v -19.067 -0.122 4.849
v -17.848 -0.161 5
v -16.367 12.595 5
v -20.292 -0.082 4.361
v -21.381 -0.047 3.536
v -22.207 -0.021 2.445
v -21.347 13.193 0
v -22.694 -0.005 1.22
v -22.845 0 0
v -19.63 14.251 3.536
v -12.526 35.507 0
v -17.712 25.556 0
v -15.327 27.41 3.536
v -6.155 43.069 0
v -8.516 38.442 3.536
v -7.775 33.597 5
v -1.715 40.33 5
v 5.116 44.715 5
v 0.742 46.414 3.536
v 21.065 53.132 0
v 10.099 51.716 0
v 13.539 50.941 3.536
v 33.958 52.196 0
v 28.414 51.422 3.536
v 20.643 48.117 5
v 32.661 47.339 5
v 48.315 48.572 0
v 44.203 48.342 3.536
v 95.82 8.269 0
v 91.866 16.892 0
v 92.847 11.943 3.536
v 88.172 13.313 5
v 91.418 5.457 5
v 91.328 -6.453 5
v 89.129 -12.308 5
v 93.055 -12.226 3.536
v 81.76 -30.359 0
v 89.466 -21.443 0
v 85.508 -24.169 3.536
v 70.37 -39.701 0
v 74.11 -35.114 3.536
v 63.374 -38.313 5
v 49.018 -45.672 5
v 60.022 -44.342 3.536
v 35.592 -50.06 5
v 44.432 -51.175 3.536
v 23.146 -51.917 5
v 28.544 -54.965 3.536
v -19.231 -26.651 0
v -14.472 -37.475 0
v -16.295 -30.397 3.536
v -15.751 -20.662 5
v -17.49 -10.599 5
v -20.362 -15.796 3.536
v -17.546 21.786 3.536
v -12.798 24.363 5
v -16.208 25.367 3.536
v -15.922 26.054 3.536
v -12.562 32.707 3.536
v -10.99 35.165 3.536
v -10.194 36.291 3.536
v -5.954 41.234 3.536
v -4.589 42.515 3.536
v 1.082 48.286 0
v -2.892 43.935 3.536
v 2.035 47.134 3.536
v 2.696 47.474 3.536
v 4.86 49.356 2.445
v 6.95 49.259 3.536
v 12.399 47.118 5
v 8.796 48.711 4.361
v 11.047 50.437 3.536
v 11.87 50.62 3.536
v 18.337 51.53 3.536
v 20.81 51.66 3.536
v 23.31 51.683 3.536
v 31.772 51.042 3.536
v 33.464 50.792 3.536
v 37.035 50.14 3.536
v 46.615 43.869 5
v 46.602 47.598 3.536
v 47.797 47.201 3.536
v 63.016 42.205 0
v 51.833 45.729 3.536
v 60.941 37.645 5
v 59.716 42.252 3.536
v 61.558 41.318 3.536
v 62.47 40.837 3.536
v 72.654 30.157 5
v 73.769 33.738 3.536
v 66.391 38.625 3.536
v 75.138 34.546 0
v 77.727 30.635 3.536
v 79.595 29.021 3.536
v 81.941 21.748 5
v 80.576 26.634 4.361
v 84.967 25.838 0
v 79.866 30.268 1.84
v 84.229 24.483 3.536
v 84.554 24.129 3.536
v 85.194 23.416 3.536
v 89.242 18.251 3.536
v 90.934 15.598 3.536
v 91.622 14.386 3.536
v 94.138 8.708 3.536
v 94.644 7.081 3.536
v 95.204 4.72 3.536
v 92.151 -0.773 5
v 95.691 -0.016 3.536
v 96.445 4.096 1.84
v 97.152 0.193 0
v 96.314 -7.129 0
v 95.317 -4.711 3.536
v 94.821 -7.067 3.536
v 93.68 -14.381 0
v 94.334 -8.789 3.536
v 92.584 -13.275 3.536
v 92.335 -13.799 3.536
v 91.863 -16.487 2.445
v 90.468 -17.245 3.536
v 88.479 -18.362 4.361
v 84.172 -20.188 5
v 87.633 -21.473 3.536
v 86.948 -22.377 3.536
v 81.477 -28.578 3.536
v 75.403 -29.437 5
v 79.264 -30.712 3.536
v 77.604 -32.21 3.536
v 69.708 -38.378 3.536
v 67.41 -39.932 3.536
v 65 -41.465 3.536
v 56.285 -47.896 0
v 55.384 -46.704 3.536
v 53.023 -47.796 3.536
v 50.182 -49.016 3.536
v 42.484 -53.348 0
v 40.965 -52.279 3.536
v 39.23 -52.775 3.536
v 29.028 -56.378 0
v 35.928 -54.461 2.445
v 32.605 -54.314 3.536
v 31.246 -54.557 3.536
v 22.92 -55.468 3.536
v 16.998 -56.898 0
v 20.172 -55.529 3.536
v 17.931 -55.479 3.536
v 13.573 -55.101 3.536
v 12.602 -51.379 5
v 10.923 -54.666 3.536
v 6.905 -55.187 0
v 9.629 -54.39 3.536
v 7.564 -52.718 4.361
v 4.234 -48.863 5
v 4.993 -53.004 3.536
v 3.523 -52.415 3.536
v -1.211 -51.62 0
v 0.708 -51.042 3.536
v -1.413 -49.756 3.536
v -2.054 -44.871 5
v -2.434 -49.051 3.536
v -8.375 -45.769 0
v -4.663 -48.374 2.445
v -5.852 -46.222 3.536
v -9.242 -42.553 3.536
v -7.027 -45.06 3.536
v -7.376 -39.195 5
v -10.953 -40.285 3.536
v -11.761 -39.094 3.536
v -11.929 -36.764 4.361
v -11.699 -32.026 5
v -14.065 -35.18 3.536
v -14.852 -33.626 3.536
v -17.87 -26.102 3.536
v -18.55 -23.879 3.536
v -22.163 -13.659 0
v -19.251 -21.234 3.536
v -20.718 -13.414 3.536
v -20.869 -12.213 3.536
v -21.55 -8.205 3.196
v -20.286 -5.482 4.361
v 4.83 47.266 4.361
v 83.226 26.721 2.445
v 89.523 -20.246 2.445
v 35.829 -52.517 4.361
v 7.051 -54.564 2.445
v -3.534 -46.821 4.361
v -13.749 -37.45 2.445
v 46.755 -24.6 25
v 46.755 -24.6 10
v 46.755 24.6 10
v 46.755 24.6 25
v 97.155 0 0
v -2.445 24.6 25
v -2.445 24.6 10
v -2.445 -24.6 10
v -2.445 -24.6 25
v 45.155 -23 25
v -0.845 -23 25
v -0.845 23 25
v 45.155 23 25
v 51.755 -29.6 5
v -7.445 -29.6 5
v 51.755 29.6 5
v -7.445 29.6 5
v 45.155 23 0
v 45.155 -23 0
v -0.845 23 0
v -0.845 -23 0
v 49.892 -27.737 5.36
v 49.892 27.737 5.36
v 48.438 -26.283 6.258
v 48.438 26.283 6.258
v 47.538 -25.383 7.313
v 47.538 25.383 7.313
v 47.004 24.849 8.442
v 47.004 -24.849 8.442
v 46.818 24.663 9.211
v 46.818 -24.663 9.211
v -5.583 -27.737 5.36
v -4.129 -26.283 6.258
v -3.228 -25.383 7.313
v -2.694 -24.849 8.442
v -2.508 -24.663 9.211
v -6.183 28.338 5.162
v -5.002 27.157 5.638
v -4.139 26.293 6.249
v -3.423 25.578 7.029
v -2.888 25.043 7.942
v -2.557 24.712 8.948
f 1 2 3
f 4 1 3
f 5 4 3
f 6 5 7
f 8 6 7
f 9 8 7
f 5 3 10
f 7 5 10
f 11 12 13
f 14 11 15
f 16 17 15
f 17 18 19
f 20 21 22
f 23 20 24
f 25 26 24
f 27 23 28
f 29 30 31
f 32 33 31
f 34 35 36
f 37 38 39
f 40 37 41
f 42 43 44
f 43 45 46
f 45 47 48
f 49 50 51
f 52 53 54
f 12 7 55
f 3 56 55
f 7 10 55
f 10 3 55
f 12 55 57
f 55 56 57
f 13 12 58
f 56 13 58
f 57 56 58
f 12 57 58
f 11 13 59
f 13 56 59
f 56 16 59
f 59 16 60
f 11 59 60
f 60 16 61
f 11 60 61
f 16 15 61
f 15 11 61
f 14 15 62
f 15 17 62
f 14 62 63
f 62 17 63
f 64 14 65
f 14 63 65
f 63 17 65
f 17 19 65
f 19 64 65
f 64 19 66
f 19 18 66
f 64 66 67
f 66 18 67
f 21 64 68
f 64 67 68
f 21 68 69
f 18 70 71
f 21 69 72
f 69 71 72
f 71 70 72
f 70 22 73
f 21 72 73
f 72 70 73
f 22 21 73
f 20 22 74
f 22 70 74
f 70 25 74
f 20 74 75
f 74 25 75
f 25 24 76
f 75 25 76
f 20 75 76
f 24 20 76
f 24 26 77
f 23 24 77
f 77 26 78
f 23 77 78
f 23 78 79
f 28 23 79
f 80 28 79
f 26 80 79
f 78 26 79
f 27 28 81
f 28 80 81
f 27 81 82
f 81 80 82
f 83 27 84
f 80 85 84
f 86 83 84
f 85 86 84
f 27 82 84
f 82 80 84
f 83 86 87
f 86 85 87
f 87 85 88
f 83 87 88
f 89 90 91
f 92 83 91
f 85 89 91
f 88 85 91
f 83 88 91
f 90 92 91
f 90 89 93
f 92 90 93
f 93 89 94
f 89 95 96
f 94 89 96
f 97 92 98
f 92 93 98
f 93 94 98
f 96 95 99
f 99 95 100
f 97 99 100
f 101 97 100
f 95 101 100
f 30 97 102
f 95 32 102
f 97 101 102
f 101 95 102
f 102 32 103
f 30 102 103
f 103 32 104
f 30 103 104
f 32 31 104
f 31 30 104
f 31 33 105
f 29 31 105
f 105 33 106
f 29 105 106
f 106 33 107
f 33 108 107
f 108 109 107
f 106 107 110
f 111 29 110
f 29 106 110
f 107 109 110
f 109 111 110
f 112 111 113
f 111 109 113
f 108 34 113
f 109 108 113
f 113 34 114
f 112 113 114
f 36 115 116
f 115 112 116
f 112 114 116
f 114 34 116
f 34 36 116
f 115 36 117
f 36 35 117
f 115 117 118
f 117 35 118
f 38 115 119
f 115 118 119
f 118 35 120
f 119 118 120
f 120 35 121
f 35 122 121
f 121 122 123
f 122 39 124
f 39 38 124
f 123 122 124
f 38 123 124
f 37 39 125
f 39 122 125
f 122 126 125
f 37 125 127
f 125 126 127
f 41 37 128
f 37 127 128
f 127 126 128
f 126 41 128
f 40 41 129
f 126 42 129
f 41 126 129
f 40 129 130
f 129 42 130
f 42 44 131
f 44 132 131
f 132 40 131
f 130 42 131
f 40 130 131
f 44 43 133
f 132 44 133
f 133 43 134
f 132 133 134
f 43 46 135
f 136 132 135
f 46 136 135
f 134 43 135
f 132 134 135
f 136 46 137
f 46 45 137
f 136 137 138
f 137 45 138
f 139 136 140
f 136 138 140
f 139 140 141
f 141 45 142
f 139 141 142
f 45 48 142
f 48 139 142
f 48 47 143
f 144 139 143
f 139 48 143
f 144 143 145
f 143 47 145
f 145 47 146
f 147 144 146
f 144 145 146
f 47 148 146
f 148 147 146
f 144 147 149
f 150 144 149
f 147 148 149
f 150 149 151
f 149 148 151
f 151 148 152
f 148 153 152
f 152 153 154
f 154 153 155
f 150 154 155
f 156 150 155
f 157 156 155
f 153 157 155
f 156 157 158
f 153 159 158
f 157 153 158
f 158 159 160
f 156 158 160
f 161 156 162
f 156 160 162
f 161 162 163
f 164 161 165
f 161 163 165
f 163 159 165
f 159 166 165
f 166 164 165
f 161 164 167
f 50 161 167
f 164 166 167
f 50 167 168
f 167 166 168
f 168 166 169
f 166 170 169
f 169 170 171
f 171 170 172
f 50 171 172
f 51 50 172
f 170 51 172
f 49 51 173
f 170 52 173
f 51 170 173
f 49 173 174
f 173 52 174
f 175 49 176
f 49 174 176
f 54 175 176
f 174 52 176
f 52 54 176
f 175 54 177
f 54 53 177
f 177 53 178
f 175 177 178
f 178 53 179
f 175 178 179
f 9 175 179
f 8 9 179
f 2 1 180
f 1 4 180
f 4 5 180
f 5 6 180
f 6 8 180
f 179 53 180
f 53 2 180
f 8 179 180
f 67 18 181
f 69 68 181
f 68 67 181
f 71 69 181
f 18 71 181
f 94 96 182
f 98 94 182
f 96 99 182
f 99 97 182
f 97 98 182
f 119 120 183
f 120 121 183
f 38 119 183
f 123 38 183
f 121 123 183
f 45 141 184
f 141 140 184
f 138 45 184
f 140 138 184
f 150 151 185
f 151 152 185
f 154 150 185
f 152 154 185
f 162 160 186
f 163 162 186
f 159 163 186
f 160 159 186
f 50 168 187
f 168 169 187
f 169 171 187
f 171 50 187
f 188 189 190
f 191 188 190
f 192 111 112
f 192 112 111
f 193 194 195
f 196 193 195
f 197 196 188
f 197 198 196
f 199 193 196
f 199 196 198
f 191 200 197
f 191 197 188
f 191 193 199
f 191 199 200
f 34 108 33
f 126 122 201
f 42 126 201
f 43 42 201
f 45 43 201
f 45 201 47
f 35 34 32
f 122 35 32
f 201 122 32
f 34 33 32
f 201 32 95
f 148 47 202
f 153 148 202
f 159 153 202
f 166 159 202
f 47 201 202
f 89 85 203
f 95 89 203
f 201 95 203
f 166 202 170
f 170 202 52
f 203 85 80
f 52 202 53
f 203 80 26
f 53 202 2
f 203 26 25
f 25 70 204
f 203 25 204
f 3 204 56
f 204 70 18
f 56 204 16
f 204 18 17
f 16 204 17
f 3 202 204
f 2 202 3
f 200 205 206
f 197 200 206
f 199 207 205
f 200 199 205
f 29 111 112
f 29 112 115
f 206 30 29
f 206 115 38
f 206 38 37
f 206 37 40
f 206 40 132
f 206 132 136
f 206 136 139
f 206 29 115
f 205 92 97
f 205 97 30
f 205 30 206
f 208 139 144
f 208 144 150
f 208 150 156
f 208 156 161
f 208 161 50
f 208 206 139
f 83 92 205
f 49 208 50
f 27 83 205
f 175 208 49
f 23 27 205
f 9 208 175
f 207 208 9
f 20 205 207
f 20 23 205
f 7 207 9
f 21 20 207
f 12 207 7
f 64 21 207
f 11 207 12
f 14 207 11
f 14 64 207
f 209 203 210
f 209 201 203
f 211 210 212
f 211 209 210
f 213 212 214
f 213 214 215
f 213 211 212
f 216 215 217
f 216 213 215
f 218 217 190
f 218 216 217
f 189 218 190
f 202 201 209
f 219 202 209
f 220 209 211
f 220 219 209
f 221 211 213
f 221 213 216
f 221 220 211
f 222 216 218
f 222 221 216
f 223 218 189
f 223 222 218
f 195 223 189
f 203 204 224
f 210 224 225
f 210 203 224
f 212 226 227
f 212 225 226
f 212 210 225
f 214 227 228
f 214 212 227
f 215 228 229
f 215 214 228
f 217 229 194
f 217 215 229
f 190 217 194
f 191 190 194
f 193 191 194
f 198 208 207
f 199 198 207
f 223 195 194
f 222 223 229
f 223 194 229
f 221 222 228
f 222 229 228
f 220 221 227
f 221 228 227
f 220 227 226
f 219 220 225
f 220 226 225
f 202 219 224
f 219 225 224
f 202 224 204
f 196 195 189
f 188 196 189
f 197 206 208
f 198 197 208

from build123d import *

# Parameters (mm, degrees)
F1_DEPTH = 5
F2_DEPTH = 25
F3_R     = 4.99999


# Not quite as in the source:
# - a fillet or chamfer is up to 0.001 mm smaller than in the source, because OpenCascade refuses the exact size


with BuildPart() as f1:
    # F0 (on Top) → F1 (new body)
    with BuildSketch(Plane.XY):
        with BuildLine():
            add(Edge.make_bspline(
                [(0, 47.6761966849), (31.7996343084, 66.3650460849), (162.4107710873, 1.1493064278), (-0.5654891103, -87.7590913423), (-23.5407682827, -21.5589349291), (-22.8451150266, 0)],
                knots=[0, 0, 0, 0, 0.3365827736, 0.6764560587, 0.845419572, 0.845419572, 0.845419572, 0.845419572], degree=3))
            add(Edge.make_bspline(
                [(-22.8451150266, 0), (-22.2086795266, 19.7237221407), (-14.6044345316, 39.0930766752), (0, 47.6761966849)],
                knots=[0.845419572, 0.845419572, 0.845419572, 0.845419572, 1, 1, 1, 1], degree=3))
        make_face()
        Polygon((-2.4451150266, -24.6), (-2.4451150266, 0), (-2.4451150266, 24.6), (46.7548849734, 24.6), (46.7548849734, -24.6), align=None, mode=Mode.SUBTRACT)
    extrude(amount=F1_DEPTH)

    # F0 (on Top) → F2 (join)
    with BuildSketch(Plane.XY):
        Polygon((-2.4451150266, 24.6), (-2.4451150266, 0), (-2.4451150266, -24.6), (46.7548849734, -24.6), (46.7548849734, 24.6), align=None)
        Polygon((-0.8451150266, -23), (-0.8451150266, 0), (-0.8451150266, 23), (45.1548849734, 23), (45.1548849734, -23), align=None, mode=Mode.SUBTRACT)
    extrude(amount=F2_DEPTH)

    # F3 (radius 5 in the source; OpenCascade refuses exactly that, so slightly less here)
    f3_edges = [f1.edges().sort_by_distance(p)[0] for p in [
        (46.754885, 0, 5),
        (22.154885, -24.6, 5),
        (-2.445115, 0, 5),
        (22.154885, 24.6, 5),
        (84.577965, -27.452992, 5),
    ]]
    fillet(f3_edges, radius=F3_R)


solid = f1.part
